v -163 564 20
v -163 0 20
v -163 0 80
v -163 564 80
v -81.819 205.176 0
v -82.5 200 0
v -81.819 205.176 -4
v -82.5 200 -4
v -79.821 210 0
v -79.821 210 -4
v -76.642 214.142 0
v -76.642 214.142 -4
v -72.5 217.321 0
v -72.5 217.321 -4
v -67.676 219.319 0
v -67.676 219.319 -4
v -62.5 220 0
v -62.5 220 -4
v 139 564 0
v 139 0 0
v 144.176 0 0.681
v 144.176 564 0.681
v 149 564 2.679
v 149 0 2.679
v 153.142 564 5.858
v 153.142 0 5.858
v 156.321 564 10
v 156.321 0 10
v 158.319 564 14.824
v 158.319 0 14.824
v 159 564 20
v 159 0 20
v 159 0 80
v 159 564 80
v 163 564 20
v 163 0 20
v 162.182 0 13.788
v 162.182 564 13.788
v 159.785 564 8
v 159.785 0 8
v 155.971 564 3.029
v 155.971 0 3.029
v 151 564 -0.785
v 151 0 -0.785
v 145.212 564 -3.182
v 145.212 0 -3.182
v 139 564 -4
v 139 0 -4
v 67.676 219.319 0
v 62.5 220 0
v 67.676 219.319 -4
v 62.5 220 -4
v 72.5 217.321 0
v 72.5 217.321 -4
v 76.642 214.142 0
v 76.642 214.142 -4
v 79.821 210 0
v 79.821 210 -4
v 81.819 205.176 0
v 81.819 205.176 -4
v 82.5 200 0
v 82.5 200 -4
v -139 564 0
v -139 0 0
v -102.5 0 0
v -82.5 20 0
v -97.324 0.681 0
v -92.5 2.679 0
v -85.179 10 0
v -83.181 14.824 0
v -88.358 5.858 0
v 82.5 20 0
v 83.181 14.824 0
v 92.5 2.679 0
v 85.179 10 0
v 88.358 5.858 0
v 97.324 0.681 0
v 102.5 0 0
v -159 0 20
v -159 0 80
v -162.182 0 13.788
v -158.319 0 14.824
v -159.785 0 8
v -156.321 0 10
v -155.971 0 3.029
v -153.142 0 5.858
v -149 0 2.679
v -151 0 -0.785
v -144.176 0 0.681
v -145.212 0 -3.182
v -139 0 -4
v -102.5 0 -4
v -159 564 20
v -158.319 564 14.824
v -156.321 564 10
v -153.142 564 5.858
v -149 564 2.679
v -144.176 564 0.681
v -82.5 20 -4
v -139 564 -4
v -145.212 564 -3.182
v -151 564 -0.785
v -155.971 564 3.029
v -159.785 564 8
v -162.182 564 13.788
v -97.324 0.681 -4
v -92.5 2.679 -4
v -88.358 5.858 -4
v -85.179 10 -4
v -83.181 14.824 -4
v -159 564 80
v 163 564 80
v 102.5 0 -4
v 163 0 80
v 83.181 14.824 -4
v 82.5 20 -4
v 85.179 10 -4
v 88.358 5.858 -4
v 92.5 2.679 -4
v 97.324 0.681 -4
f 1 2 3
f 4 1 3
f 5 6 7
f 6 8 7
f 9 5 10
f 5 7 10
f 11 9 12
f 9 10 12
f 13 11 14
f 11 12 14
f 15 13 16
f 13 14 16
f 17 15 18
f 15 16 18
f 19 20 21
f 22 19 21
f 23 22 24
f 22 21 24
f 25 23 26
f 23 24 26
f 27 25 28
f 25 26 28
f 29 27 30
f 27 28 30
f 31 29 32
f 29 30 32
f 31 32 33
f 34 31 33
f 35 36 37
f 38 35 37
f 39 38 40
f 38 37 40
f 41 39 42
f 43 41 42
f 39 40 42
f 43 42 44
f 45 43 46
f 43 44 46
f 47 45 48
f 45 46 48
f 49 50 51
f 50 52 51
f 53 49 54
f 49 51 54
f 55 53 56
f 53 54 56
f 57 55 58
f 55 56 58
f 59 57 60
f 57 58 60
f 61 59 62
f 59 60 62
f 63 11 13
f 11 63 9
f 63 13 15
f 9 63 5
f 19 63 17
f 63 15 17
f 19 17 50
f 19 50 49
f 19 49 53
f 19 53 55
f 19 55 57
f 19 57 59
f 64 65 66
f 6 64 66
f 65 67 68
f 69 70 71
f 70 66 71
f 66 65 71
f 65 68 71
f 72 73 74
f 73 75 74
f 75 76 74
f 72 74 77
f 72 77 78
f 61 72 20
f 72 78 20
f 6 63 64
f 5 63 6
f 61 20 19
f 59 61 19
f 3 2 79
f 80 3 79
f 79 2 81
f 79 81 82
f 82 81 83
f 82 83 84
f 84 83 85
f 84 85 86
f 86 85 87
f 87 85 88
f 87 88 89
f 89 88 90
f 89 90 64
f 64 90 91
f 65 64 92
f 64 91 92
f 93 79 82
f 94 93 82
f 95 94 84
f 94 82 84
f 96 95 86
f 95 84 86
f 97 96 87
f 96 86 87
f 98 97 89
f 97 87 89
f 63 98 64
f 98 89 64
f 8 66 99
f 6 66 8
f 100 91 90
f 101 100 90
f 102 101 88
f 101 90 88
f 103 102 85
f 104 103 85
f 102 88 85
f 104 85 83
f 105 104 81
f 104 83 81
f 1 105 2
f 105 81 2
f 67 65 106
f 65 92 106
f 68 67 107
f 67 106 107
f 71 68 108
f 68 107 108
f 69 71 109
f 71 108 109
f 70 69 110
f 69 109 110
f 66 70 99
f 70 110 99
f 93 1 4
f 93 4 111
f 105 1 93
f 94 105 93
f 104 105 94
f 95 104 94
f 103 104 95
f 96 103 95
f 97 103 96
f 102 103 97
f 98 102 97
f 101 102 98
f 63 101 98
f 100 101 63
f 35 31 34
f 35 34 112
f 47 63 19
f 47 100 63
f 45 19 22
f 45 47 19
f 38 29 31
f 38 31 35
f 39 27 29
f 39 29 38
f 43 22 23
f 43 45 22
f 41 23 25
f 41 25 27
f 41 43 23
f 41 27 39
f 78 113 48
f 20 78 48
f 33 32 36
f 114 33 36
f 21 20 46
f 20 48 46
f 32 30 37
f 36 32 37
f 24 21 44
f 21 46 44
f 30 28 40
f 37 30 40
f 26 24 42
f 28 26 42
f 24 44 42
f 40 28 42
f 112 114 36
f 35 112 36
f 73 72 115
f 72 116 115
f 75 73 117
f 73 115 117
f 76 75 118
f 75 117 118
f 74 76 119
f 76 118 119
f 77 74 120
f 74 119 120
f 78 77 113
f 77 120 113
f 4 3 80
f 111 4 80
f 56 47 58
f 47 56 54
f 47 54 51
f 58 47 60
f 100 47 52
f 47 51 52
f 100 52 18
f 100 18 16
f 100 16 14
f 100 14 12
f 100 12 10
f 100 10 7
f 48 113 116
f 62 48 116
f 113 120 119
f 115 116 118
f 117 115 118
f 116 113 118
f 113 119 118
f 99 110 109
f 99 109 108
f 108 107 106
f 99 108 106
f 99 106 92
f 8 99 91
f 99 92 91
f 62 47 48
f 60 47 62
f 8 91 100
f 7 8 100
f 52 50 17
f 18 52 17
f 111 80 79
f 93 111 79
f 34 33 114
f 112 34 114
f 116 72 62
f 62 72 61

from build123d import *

# Parameters (mm, degrees)
EXTRUDE_THIN1_DEPTH     = 564
CUT_EXTRUDE2_DEPTH      = 594.060705156
CUT_EXTRUDE2_DEPTH_BACK = 594.060705156
SKETCH3_W               = 165
SKETCH3_H               = 220
FILLET1_R               = 20


with BuildPart() as part:
    # Sketch1 → Extrude-Thin1 (new body)
    with BuildSketch(Plane(origin=(0, 0, 0), x_dir=(1, 0, 0), z_dir=(0, 1, 0))):
        with BuildLine():
            Line((-159, -80), (-159, -20))
            ThreePointArc((-159, -20), (-153.142135624, -5.857864376), (-139, 0))
            Line((-139, 0), (139, 0))
            ThreePointArc((139, 0), (153.142135624, -5.857864376), (159, -20))
            Line((159, -20), (159, -80))
            Line((159, -80), (163, -80))
            Line((163, -80), (163, -20))
            ThreePointArc((163, -20), (155.970562748, -3.029437252), (139, 4))
            Line((139, 4), (-139, 4))
            ThreePointArc((-139, 4), (-155.970562748, -3.029437252), (-163, -20))
            Line((-163, -20), (-163, -80))
            Line((-163, -80), (-159, -80))
        make_face()
    extrude(amount=EXTRUDE_THIN1_DEPTH)

    # Sketch3 → Cut-Extrude2 (cut, two sides: drawn at the far end of the back side and taken through both)
    with BuildSketch(Plane(origin=(0, 0, -4), x_dir=(-1, 0, 0), z_dir=(0, 0, -1)).offset(-CUT_EXTRUDE2_DEPTH_BACK)):
        with Locations((0, 110)):
            Rectangle(SKETCH3_W, SKETCH3_H)
    extrude(amount=CUT_EXTRUDE2_DEPTH + CUT_EXTRUDE2_DEPTH_BACK, mode=Mode.SUBTRACT)

    # Fillet1
    fillet1_edges = [part.edges().sort_by_distance(p)[0] for p in [
        (-82.5, 0, -2),
        (82.5, 0, -2),
        (82.5, 220, -2),
        (-82.5, 220, -2),
    ]]
    fillet(fillet1_edges, radius=FILLET1_R)


solid = part.part
